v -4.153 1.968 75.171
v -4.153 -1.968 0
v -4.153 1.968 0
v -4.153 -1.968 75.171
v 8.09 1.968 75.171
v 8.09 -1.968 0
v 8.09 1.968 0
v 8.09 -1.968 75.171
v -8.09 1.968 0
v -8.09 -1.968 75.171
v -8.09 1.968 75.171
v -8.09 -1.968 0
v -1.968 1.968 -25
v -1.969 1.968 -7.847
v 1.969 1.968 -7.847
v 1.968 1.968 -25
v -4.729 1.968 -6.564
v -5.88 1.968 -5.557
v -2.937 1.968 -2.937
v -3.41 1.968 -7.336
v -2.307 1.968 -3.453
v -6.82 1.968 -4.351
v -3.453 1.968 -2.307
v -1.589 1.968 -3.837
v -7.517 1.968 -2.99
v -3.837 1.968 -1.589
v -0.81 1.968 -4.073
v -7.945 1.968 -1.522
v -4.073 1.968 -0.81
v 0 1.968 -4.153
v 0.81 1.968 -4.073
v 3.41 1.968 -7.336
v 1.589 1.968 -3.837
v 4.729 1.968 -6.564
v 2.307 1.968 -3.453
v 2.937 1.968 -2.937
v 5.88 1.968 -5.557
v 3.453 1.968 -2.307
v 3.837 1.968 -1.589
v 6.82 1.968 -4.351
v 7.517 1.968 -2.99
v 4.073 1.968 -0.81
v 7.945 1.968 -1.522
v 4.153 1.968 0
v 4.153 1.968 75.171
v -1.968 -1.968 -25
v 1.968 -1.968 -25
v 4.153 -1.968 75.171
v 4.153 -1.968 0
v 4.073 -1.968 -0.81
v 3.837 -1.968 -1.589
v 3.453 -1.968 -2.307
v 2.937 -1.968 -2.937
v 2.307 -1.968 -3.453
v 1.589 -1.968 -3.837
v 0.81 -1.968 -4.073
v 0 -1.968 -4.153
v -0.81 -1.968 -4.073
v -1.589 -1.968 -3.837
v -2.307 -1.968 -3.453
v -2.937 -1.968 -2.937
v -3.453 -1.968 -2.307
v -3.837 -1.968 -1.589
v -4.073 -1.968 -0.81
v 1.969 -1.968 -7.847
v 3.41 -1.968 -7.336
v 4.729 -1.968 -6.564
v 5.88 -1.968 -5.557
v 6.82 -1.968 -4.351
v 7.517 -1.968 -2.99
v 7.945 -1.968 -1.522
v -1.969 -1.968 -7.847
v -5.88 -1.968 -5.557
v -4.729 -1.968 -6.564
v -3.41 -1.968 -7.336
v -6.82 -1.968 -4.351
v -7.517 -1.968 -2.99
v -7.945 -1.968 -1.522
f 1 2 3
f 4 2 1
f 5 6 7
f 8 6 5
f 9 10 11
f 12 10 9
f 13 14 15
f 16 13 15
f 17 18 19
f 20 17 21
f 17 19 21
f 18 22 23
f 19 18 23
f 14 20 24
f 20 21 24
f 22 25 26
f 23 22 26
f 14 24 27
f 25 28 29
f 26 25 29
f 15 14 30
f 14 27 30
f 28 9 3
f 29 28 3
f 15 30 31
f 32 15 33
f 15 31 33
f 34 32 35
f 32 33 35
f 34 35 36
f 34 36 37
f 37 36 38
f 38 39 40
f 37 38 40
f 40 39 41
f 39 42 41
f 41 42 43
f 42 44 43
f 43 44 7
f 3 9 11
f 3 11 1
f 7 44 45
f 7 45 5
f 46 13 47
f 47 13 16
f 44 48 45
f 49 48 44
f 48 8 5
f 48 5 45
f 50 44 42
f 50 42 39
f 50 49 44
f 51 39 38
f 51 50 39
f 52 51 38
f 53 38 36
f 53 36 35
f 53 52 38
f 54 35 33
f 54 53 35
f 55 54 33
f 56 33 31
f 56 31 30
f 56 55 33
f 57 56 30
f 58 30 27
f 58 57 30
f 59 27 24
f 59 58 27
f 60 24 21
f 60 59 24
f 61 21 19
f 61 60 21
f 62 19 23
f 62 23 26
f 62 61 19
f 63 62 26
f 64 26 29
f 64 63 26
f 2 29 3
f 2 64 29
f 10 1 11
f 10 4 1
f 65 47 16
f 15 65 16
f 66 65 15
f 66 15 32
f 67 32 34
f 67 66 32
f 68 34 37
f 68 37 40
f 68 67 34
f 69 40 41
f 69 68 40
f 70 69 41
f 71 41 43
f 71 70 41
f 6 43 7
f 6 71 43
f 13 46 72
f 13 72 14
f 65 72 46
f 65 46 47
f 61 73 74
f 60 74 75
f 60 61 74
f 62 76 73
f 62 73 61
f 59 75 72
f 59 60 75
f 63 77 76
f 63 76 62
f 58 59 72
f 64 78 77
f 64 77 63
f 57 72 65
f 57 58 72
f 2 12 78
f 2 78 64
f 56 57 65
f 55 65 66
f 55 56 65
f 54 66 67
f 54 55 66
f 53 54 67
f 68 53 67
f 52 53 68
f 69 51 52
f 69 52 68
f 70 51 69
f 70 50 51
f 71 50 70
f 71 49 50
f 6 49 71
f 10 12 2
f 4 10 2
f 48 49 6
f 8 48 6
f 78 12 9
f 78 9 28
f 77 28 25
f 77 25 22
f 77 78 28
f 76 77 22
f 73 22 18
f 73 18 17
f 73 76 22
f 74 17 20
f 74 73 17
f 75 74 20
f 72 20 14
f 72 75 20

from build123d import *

# Parameters (mm, degrees)
F1_DEPTH = 1.9685
F3_W     = 3.937
F3_H     = 3.937


with BuildPart() as f1:
    # F0 (on Front) → F1 (new body, symmetric)
    with BuildSketch(Plane.XZ):
        with BuildLine():
            Line((-4.1529, 75.1713), (-8.0899, 75.1713))
            Line((-8.0899, 75.1713), (-8.0899, 0))
            ThreePointArc((-8.0899, 0), (0, -8.0899), (8.0899, 0))
            Line((8.0899, 0), (8.0899, 75.1713))
            Line((8.0899, 75.1713), (4.1529, 75.1713))
            Line((4.1529, 75.1713), (4.1529, 0))
            ThreePointArc((4.1529, 0), (0, -4.1529), (-4.1529, 0))
            Line((-4.1529, 0), (-4.1529, 75.1713))
        make_face()
    extrude(amount=F1_DEPTH, both=True)

    # F3 (on offset) → F4 (join, up to the next surface of F1)
    with BuildSketch(Plane.XY.offset(-25)):
        Rectangle(F3_W, F3_H)
    extrude(until=Until.NEXT)


solid = f1.part
